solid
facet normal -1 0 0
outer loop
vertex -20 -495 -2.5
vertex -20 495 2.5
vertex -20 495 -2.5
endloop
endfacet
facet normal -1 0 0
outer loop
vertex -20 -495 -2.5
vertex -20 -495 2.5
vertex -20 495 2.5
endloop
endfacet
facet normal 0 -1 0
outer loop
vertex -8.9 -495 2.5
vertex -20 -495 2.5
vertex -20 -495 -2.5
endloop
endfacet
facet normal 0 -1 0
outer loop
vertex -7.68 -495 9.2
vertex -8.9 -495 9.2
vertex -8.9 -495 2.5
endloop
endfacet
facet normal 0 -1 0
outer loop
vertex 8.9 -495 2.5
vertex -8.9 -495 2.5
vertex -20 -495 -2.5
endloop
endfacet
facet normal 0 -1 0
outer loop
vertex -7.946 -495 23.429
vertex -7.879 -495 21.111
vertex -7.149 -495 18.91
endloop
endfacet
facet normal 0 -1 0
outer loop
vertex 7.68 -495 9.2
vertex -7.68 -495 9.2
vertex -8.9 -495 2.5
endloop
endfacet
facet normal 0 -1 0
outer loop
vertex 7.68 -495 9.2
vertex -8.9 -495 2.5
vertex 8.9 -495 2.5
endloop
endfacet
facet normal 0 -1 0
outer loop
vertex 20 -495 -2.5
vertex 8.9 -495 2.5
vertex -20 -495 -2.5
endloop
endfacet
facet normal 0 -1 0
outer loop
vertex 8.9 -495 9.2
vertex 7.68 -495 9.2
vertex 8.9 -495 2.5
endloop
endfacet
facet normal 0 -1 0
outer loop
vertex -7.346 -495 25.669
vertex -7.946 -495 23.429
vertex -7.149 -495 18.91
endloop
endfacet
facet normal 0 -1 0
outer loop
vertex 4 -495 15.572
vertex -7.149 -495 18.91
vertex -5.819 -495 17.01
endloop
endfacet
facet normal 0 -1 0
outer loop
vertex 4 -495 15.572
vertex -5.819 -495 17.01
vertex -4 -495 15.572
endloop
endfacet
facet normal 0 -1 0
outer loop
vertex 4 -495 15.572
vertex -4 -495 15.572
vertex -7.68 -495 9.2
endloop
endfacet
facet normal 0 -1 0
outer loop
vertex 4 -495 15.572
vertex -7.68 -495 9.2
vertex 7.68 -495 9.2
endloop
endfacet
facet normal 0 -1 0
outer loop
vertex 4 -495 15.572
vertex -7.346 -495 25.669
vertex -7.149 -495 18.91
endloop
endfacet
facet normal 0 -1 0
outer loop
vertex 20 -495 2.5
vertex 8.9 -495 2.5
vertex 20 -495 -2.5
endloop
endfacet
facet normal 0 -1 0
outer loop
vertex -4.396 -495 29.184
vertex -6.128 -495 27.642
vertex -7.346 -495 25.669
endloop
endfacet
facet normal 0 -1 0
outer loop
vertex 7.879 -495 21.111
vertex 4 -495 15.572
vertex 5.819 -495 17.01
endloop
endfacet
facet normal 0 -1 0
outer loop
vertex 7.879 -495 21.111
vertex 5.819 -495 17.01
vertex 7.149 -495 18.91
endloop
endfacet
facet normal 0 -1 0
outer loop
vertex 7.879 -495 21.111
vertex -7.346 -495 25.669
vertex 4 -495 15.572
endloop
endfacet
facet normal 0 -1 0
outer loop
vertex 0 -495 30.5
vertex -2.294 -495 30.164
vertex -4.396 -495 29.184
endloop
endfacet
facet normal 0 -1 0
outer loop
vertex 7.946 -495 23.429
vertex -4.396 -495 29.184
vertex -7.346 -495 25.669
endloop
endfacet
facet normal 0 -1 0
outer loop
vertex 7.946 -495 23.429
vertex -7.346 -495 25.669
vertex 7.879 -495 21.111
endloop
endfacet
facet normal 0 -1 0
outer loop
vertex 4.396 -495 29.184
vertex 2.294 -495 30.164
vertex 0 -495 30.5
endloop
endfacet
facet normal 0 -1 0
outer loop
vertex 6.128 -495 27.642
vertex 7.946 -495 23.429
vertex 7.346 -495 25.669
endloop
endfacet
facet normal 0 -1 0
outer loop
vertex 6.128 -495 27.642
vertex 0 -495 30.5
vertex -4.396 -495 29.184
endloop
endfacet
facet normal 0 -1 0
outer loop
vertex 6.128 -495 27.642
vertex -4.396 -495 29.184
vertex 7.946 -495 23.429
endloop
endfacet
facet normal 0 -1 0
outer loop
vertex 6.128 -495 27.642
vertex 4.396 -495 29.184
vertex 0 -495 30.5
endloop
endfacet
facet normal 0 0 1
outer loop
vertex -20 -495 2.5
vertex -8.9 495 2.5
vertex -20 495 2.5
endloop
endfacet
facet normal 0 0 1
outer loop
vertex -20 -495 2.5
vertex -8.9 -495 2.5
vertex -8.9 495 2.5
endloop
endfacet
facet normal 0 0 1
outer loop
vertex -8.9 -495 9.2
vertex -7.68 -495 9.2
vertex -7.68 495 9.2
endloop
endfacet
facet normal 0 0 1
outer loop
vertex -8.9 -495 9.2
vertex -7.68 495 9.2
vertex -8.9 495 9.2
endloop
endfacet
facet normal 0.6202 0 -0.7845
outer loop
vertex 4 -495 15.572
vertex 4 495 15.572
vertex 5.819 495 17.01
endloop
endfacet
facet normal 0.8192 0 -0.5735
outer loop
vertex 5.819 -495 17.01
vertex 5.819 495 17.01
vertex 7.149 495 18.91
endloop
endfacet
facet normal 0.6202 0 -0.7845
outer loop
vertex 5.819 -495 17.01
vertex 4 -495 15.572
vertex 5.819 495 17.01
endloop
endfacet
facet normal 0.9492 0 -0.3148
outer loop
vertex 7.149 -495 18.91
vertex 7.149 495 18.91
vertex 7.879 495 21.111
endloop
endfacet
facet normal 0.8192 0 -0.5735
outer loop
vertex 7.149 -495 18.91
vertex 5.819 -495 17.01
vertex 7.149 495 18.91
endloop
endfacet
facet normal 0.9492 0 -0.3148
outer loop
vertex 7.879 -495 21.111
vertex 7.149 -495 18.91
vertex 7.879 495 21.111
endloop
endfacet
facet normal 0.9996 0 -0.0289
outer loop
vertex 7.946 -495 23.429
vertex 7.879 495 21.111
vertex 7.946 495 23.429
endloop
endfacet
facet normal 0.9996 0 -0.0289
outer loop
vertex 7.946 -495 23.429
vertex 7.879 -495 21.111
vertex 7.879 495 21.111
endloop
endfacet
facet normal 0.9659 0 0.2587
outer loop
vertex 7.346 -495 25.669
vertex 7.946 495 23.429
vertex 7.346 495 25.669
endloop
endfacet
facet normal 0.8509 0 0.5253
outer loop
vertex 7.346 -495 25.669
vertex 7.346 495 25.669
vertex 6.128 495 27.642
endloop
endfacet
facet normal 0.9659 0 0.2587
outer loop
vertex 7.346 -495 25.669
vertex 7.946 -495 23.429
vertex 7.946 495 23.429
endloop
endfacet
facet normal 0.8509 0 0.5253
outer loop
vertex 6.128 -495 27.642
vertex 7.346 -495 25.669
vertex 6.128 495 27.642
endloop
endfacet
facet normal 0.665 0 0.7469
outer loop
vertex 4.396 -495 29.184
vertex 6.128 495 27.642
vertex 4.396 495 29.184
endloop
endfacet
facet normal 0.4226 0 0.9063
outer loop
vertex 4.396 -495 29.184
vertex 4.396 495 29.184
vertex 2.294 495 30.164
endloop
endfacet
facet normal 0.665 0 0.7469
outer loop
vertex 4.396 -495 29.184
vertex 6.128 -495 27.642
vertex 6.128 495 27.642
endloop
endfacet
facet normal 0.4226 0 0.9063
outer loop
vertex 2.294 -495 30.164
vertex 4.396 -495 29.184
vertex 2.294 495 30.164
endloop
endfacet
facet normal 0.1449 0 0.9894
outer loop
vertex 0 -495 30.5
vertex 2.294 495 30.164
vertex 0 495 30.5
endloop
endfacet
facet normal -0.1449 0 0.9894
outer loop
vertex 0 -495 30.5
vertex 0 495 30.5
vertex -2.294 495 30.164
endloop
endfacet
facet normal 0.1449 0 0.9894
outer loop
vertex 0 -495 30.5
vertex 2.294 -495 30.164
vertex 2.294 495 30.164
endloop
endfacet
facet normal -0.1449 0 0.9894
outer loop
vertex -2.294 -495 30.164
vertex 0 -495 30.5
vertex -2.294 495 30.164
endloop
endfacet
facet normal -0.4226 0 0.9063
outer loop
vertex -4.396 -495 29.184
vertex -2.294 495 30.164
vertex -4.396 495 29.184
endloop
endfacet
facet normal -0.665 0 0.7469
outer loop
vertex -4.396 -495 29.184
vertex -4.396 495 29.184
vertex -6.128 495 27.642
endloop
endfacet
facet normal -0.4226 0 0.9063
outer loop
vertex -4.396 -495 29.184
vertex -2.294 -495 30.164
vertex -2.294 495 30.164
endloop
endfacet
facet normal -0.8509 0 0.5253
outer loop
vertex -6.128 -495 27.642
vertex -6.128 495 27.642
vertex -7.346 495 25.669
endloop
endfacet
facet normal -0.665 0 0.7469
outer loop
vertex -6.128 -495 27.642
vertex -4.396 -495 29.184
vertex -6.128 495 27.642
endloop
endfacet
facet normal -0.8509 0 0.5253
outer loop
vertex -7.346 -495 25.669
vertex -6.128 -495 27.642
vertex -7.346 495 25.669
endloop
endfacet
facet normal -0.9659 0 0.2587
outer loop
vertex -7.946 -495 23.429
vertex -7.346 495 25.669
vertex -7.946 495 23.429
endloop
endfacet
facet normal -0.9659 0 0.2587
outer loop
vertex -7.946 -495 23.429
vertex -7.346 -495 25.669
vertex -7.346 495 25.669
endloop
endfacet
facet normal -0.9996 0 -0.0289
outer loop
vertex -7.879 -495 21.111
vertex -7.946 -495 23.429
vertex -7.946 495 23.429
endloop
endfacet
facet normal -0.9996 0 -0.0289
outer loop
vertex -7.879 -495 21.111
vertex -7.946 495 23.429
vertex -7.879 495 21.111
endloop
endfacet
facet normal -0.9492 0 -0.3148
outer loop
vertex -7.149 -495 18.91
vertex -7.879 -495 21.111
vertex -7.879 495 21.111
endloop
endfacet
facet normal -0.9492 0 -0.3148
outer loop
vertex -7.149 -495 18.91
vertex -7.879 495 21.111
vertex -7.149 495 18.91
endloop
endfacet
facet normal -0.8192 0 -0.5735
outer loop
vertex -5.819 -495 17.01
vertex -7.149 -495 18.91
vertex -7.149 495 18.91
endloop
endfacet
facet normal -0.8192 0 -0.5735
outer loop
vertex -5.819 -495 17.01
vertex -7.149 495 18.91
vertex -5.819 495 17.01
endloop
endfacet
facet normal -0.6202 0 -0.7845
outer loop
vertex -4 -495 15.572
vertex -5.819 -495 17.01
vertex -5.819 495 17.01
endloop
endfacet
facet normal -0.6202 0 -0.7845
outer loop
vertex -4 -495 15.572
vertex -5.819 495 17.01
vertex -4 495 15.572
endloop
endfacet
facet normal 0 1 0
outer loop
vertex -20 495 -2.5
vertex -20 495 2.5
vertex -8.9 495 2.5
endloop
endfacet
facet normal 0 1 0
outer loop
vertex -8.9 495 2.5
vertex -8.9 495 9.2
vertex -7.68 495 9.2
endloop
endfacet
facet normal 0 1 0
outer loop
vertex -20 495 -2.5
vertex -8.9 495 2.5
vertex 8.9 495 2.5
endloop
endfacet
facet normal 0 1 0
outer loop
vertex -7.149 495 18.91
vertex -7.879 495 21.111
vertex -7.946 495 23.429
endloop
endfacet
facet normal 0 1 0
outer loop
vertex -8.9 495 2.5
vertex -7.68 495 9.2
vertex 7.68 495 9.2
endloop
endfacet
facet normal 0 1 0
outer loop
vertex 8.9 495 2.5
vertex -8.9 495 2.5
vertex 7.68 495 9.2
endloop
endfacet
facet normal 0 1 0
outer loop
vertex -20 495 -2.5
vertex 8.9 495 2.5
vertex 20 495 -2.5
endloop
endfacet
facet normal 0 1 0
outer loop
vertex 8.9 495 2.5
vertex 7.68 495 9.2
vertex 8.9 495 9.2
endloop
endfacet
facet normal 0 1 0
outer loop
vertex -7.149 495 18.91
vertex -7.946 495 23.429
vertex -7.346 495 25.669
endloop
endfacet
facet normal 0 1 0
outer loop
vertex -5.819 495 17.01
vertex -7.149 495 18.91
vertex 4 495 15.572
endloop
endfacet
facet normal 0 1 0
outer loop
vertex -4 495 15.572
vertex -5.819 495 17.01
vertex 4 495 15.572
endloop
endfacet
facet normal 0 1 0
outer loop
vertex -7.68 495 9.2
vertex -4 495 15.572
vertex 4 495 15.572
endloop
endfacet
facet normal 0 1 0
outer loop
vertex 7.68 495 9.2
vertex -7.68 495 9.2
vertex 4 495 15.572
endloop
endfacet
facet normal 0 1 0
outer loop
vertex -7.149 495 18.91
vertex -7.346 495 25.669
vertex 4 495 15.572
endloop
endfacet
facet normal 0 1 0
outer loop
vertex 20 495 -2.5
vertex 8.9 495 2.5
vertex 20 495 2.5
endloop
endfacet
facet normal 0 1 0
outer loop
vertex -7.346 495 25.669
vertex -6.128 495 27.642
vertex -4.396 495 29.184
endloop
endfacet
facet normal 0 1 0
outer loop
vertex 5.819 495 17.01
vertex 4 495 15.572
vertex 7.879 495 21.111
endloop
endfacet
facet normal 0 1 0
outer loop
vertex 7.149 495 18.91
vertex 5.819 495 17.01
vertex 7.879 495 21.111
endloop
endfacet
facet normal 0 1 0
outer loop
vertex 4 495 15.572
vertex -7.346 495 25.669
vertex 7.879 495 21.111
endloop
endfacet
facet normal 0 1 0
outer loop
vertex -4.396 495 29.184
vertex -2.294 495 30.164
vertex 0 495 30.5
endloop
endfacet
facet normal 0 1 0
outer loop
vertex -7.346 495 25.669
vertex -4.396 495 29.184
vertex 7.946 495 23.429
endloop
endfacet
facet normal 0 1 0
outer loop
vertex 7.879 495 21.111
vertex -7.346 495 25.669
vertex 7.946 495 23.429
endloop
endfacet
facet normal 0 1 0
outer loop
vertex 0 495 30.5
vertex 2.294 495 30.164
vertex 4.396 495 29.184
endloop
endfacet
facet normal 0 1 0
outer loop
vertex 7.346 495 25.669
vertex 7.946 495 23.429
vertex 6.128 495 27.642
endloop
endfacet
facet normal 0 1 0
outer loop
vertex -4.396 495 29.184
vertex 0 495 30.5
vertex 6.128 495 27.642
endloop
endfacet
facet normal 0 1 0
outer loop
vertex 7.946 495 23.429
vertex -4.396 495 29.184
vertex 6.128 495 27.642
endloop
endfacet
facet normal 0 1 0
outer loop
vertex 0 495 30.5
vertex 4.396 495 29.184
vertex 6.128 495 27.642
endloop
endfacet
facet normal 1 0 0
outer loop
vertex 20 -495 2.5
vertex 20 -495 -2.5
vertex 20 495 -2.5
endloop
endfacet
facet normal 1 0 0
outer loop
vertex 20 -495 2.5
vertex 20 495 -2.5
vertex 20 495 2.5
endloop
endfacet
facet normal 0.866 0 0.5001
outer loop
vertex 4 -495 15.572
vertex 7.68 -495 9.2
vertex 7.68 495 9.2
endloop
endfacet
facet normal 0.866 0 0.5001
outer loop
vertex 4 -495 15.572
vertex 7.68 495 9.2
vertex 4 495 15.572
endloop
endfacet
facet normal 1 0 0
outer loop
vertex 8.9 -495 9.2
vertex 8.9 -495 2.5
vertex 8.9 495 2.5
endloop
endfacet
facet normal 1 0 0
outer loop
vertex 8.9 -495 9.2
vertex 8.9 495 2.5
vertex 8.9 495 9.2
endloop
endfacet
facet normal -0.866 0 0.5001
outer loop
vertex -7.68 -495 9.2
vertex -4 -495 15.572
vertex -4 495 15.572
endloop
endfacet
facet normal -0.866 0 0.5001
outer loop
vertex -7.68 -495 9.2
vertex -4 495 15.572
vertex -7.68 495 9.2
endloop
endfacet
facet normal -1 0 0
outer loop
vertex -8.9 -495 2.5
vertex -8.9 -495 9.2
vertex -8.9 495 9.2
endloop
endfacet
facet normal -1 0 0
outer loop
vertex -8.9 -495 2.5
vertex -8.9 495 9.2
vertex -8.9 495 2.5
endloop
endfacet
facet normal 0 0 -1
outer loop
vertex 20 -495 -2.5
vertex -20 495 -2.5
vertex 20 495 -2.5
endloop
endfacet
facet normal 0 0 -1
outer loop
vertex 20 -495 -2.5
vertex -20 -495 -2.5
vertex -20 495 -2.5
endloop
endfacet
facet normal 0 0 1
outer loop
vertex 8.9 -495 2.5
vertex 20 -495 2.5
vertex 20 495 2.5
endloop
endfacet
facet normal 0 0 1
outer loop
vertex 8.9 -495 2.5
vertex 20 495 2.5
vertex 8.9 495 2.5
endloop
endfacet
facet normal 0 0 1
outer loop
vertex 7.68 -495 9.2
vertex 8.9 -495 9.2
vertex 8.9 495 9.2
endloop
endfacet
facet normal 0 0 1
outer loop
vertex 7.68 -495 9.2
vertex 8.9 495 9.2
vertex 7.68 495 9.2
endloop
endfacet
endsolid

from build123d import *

# Parameters (mm, degrees)
F1_DEPTH = 495


with BuildPart() as f1:
    # F0 (on Front) → F1 (new body, symmetric)
    with BuildSketch(Plane.XZ):
        with BuildLine():
            Line((-20, -2.5), (20, -2.5))
            Line((20, -2.5), (20, 2.5))
            Line((20, 2.5), (8.9, 2.5))
            Line((8.9, 2.5), (8.9, 9.2))
            Line((8.9, 9.2), (7.68, 9.2))
            Line((7.68, 9.2), (4.000485, 15.572077))
            ThreePointArc((4.000485, 15.572077), (0, 30.5), (-4.000485, 15.572077))
            Line((-4.000485, 15.572077), (-7.68, 9.2))
            Line((-7.68, 9.2), (-8.9, 9.2))
            Line((-8.9, 9.2), (-8.9, 2.5))
            Line((-8.9, 2.5), (-20, 2.5))
            Line((-20, 2.5), (-20, -2.5))
        make_face()
    extrude(amount=F1_DEPTH, both=True)


solid = f1.part
